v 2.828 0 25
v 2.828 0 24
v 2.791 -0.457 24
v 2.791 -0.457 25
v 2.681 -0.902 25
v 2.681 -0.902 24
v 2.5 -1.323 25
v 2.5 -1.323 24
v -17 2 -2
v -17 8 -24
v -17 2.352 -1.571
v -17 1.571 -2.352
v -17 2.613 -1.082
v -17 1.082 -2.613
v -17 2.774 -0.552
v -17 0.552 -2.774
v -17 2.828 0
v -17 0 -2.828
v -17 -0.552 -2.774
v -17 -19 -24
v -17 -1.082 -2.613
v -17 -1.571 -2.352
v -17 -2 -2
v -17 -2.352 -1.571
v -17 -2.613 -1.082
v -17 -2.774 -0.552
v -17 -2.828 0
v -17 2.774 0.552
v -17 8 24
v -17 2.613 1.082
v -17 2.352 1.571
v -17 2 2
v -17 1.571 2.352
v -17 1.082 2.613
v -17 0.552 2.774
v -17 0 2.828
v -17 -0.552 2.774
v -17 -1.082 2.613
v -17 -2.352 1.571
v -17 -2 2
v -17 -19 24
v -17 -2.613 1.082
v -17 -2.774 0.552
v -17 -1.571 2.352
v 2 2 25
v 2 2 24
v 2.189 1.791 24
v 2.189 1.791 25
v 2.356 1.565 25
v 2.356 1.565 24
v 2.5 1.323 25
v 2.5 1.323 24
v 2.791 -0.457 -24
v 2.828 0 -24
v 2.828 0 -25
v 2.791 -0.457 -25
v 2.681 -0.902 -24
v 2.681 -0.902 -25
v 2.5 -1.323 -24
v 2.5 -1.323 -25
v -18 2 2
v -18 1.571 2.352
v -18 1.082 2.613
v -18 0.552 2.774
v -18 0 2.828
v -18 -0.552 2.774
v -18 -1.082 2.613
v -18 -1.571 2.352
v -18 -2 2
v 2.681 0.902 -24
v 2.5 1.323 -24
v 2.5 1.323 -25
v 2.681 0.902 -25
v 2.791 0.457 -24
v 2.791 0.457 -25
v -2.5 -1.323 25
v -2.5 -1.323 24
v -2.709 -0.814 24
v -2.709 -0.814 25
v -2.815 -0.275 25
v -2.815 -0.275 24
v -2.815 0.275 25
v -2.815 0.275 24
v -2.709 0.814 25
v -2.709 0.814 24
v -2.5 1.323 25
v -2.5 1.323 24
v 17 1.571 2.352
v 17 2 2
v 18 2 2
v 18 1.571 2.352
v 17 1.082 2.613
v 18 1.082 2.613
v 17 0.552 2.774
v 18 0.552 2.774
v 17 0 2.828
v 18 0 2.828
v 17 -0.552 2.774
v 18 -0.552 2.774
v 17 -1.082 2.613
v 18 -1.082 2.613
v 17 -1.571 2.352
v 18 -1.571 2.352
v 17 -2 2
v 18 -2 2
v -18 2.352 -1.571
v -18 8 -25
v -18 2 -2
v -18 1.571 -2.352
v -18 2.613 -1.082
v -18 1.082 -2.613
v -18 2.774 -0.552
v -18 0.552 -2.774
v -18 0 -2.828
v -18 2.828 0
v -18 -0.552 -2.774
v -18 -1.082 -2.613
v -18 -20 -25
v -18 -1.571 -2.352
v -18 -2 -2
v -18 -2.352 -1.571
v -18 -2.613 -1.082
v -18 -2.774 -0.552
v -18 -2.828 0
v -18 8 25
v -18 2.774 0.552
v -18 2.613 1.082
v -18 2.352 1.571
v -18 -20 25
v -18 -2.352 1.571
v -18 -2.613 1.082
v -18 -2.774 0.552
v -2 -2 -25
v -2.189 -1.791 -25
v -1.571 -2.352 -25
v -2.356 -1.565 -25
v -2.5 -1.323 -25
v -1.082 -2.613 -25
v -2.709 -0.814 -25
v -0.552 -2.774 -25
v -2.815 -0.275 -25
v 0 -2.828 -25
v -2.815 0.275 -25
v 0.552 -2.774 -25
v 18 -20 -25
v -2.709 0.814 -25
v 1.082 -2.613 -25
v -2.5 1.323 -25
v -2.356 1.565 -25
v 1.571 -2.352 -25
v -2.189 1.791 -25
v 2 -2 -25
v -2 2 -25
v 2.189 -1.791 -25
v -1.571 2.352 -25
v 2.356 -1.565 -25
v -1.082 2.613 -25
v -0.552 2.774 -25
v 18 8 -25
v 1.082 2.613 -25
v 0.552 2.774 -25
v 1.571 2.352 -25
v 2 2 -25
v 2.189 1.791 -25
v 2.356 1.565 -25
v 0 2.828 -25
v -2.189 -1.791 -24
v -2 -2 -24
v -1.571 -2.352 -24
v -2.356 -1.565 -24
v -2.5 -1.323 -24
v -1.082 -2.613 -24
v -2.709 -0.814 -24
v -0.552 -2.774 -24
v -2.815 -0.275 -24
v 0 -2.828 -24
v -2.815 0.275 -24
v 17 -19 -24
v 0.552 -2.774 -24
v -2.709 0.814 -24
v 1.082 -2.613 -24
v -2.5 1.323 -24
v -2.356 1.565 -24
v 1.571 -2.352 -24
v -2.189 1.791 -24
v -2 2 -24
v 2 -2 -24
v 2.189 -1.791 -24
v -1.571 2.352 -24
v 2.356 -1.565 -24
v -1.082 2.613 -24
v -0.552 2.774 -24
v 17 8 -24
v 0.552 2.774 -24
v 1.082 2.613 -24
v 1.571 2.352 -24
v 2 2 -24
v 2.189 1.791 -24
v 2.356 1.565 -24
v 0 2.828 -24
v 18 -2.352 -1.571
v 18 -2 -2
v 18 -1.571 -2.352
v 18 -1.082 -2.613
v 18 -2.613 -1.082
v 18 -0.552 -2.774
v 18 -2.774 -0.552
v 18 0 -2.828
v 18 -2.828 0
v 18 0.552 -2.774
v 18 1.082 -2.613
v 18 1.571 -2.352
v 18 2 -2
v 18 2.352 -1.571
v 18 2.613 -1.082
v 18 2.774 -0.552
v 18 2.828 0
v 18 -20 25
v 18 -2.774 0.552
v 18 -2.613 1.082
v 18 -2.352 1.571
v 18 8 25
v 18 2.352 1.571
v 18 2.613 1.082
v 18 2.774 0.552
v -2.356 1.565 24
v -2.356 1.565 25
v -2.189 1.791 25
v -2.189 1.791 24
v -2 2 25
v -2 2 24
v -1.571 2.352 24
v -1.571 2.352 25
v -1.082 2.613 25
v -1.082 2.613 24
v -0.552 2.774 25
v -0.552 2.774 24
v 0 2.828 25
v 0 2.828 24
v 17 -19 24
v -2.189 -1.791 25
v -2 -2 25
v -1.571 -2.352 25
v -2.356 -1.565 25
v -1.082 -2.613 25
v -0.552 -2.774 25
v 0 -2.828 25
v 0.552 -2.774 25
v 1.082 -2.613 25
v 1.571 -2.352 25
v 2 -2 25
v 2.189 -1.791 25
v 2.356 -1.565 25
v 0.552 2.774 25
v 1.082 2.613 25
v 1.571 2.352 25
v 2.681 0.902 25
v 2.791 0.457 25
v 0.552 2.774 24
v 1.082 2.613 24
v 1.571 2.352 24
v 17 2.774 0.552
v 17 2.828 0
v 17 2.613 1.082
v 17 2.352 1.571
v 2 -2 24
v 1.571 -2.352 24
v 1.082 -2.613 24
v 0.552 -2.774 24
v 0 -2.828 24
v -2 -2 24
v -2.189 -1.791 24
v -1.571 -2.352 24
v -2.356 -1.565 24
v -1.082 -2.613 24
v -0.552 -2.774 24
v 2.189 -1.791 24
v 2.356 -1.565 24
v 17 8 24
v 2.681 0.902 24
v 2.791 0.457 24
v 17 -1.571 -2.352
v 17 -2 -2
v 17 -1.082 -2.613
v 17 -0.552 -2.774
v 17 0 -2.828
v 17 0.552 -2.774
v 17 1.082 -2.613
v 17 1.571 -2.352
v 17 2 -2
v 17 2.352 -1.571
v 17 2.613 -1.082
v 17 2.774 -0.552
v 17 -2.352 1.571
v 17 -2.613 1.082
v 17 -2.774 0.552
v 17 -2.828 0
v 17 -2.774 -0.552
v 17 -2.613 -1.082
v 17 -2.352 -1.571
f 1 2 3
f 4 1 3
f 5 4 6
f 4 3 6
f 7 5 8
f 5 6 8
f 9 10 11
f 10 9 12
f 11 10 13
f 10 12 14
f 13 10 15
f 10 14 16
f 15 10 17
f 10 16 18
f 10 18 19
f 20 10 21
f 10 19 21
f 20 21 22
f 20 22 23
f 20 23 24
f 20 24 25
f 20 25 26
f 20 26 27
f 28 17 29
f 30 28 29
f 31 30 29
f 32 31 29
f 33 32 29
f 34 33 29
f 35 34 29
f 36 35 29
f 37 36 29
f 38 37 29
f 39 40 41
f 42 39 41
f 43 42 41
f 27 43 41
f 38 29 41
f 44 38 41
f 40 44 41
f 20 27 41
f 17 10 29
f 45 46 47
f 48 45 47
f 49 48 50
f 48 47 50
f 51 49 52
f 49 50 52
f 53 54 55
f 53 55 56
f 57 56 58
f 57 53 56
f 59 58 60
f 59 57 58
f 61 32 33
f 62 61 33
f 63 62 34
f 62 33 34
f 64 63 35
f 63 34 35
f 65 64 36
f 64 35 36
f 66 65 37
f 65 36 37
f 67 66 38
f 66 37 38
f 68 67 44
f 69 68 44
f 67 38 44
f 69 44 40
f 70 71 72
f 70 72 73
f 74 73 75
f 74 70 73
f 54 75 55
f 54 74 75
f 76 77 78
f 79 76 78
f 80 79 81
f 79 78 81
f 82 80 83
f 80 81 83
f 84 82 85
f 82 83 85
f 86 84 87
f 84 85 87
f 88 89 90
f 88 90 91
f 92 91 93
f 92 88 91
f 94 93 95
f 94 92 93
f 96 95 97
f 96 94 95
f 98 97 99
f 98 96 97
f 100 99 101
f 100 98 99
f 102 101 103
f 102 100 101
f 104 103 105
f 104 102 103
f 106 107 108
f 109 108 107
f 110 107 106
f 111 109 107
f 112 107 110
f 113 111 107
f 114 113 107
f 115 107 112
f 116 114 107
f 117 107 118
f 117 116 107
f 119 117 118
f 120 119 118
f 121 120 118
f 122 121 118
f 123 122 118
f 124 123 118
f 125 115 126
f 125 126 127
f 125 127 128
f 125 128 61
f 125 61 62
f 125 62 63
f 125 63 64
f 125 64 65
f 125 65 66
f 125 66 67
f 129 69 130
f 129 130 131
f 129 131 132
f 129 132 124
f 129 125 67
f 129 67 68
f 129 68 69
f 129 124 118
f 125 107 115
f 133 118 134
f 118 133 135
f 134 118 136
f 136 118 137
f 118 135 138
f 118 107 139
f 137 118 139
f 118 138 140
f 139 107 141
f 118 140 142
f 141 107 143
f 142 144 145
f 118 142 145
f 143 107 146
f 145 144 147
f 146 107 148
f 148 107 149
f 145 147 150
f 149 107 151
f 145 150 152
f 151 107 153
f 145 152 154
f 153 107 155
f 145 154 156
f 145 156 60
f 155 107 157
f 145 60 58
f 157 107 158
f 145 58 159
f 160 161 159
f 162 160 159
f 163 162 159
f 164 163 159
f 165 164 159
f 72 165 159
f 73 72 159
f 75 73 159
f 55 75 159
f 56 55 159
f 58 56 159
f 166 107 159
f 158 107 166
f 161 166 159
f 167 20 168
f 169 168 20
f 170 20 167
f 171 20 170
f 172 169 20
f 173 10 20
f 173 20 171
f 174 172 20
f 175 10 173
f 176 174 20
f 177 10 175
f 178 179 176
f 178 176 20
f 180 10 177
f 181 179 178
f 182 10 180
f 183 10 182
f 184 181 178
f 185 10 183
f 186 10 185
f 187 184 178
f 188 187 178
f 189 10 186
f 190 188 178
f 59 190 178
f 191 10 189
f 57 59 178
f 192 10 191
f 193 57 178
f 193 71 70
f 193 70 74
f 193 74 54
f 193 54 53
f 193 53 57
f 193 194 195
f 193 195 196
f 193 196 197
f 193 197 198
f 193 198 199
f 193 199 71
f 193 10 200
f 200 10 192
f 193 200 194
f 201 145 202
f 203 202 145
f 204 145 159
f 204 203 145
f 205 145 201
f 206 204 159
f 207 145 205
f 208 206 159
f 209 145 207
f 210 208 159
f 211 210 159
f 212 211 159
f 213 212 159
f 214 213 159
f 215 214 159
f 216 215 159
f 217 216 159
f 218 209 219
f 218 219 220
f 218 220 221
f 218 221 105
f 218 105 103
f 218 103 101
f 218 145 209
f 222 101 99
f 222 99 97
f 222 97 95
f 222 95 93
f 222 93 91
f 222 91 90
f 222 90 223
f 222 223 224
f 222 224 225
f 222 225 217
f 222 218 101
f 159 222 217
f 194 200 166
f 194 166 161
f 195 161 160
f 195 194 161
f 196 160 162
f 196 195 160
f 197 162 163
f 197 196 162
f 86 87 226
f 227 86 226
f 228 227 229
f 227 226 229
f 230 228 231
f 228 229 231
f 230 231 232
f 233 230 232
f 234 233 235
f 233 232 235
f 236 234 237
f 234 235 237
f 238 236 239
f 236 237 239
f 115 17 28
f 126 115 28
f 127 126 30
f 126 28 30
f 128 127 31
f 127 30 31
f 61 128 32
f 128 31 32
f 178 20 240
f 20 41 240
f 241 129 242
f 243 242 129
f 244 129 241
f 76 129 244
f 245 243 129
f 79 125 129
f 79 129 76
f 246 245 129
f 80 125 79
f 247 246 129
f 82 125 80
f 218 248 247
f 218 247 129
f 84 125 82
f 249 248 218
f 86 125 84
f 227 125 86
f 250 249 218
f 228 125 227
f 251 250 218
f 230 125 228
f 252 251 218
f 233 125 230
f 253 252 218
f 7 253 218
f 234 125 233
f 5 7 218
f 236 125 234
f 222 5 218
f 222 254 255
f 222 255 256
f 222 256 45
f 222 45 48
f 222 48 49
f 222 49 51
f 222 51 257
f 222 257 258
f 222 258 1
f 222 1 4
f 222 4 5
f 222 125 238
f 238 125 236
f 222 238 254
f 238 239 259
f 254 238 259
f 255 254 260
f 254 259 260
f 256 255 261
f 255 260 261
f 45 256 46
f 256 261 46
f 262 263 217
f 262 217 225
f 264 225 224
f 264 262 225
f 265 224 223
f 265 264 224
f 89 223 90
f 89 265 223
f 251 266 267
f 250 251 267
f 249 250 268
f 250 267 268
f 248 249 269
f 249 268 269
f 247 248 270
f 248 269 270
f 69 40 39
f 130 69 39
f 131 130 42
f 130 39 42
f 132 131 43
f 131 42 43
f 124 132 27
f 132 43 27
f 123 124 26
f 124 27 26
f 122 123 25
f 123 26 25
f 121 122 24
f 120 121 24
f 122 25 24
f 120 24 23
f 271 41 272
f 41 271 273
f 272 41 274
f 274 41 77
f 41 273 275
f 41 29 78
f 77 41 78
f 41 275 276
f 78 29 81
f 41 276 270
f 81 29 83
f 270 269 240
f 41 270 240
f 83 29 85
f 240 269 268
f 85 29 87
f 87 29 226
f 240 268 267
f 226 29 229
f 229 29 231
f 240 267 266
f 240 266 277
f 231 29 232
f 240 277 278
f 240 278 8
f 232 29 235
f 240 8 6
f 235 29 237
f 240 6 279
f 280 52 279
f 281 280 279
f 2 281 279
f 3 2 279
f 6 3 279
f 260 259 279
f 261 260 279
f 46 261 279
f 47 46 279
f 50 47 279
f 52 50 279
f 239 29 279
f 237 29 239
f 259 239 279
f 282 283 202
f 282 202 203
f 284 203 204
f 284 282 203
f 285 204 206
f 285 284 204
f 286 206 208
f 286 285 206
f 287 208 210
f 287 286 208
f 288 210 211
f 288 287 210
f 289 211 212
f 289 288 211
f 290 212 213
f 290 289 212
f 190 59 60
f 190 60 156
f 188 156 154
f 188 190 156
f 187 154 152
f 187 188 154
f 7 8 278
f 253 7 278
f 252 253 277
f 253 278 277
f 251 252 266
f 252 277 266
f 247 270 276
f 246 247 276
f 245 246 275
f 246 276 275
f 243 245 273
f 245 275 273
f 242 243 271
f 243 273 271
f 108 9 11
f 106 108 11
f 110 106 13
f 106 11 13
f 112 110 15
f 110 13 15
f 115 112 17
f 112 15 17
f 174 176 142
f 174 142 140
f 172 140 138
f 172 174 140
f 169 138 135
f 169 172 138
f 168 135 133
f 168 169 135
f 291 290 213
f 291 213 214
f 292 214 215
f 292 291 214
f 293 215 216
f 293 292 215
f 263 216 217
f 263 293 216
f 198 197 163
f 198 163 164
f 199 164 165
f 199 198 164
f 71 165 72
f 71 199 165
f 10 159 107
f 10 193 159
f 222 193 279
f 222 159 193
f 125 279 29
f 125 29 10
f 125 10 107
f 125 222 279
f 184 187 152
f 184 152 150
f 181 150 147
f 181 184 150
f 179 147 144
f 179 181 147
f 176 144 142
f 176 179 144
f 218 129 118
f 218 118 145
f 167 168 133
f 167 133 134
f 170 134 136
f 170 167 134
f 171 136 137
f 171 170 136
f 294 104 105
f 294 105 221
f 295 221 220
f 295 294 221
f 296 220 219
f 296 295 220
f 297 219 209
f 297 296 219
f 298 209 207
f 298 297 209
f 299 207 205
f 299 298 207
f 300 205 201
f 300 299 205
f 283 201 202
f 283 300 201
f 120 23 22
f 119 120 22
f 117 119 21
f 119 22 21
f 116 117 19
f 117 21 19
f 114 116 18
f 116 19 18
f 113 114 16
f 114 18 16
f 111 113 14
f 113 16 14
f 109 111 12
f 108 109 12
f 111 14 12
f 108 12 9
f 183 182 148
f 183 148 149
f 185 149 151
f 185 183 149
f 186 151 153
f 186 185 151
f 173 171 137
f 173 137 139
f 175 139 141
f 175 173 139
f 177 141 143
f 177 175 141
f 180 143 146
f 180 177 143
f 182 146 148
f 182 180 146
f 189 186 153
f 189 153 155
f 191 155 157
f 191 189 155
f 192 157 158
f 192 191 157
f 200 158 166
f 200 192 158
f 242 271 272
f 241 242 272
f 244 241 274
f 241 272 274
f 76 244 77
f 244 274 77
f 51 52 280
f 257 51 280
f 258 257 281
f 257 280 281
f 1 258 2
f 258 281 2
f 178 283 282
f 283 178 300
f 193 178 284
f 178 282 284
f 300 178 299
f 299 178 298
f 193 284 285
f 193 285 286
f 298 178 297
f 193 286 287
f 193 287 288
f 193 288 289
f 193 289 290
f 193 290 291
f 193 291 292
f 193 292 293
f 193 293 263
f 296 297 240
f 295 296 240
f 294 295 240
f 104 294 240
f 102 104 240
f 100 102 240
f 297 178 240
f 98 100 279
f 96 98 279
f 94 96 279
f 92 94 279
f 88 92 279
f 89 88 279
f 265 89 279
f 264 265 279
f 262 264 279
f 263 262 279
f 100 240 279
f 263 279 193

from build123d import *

# Parameters (mm, degrees)
F2_DEPTH      = 25
F2_DEPTH_BACK = 25
F3_DEPTH      = 25
F3_DEPTH_BACK = 25
F4_DEPTH      = 24
F4_DEPTH_BACK = 24
F1_W          = 4
F1_H          = 4
F5_DEPTH      = 25
F5_DEPTH_BACK = 25


with BuildPart() as f2:
    # F0 (on Top) → F2 (new body, two sides)
    with BuildSketch(Plane.XY) as f2_sk:
        Polygon((-17, 0), (-17, 8), (-18, 8), (-18, -20), (18, -20), (18, 8), (17, 8), (17, 0), (17, -19), (-17, -19), align=None)
    extrude(amount=F2_DEPTH)
    extrude(f2_sk.sketch, amount=-F2_DEPTH_BACK)

    # F0 (on Top) → F3 (join, two sides)
    with BuildSketch(Plane.XY) as f3_sk:
        with BuildLine():
            ThreePointArc((17, 0), (0, -17), (-17, 0))
            Line((-17, 0), (-17, -19))
            Line((-17, -19), (17, -19))
            Line((17, -19), (17, 0))
        make_face()
        with BuildLine():
            ThreePointArc((15, 0), (10.6066017178, -10.6066017178), (0, -15))
            ThreePointArc((0, -15), (-13.1339255366, -7.2456883731), (-12.6885775404, 8))
            Line((-12.6885775404, 8), (-15, 8))
            ThreePointArc((-15, 8), (-16.4924225025, 4.1231056256), (-17, 0))
            ThreePointArc((-17, 0), (0, -17), (17, 0))
            ThreePointArc((17, 0), (16.4924225025, 4.1231056256), (15, 8))
            Line((15, 8), (12.6885775404, 8))
            ThreePointArc((12.6885775404, 8), (14.4105631935, 4.1636124275), (15, 0))
        make_face()
        with BuildLine():
            ThreePointArc((-12.6885775404, 8), (-13.1339255366, -7.2456883731), (0, -15))
            Line((0, -15), (0, -7.5))
            Line((0, -7.5), (-2.5, -7.5))
            Line((-2.5, -7.5), (-2.5, -1.3228756555))
            ThreePointArc((-2.5, -1.3228756555), (-2.8284271247, 0), (-2.5, 1.3228756555))
            Line((-2.5, 1.3228756555), (-2.5, 7.5))
            Line((-2.5, 7.5), (0, 7.5))
            Line((0, 7.5), (0, 8))
            Line((0, 8), (-12.6885775404, 8))
        make_face()
        with BuildLine():
            Line((0, -7.5), (0, -15))
            ThreePointArc((0, -15), (10.6066017178, -10.6066017178), (15, 0))
            ThreePointArc((15, 0), (14.4105631935, 4.1636124275), (12.6885775404, 8))
            Line((12.6885775404, 8), (0, 8))
            Line((0, 8), (0, 7.5))
            Line((0, 7.5), (2.5, 7.5))
            Line((2.5, 7.5), (2.5, 1.3228756555))
            ThreePointArc((2.5, 1.3228756555), (2.7450926953, 0.6815174936), (2.8284271247, 0))
            ThreePointArc((2.8284271247, 0), (2.7450926953, -0.6815174936), (2.5, -1.3228756555))
            Line((2.5, -1.3228756555), (2.5, -7.5))
            Line((2.5, -7.5), (0, -7.5))
        make_face()
        with BuildLine():
            ThreePointArc((-17, 0), (-16.4924225025, 4.1231056256), (-15, 8))
            Line((-15, 8), (-17, 8))
            Line((-17, 8), (-17, 0))
        make_face()
        with BuildLine():
            Line((17, 8), (15, 8))
            ThreePointArc((15, 8), (16.4924225025, 4.1231056256), (17, 0))
            Line((17, 0), (17, 8))
        make_face()
        with BuildLine():
            Line((0, 2.8284271247), (0, 7.5))
            Line((0, 7.5), (-2.5, 7.5))
            Line((-2.5, 7.5), (-2.5, 1.3228756555))
            ThreePointArc((-2.5, 1.3228756555), (-2.2753295024, 1.6801415582), (-2, 2))
            ThreePointArc((-2, 2), (-1.0823922003, 2.6131259298), (0, 2.8284271247))
        make_face()
        with BuildLine():
            Line((2.5, 7.5), (0, 7.5))
            Line((0, 7.5), (0, 2.8284271247))
            ThreePointArc((0, 2.8284271247), (1.0823922003, 2.6131259298), (2, 2))
            ThreePointArc((2, 2), (2.2753295024, 1.6801415582), (2.5, 1.3228756555))
            Line((2.5, 1.3228756555), (2.5, 7.5))
        make_face()
        with BuildLine():
            Line((0, -2.8284271247), (0, -7.5))
            Line((0, -7.5), (2.5, -7.5))
            Line((2.5, -7.5), (2.5, -1.3228756555))
            ThreePointArc((2.5, -1.3228756555), (2.2753295024, -1.6801415582), (2, -2))
            ThreePointArc((2, -2), (1.0823922003, -2.6131259298), (0, -2.8284271247))
        make_face()
        with BuildLine():
            Line((-2.5, -7.5), (0, -7.5))
            Line((0, -7.5), (0, -2.8284271247))
            ThreePointArc((0, -2.8284271247), (-1.0823922003, -2.6131259298), (-2, -2))
            ThreePointArc((-2, -2), (-2.2753295024, -1.6801415582), (-2.5, -1.3228756555))
            Line((-2.5, -1.3228756555), (-2.5, -7.5))
        make_face()
    extrude(amount=F3_DEPTH)
    extrude(f3_sk.sketch, amount=-F3_DEPTH_BACK)

    # F0 (on Top) → F4 (cut, two sides)
    with BuildSketch(Plane.XY) as f4_sk:
        with BuildLine():
            ThreePointArc((17, 0), (0, -17), (-17, 0))
            Line((-17, 0), (-17, -19))
            Line((-17, -19), (17, -19))
            Line((17, -19), (17, 0))
        make_face()
        with BuildLine():
            Line((0, -7.5), (0, -15))
            ThreePointArc((0, -15), (10.6066017178, -10.6066017178), (15, 0))
            ThreePointArc((15, 0), (14.4105631935, 4.1636124275), (12.6885775404, 8))
            Line((12.6885775404, 8), (0, 8))
            Line((0, 8), (0, 7.5))
            Line((0, 7.5), (2.5, 7.5))
            Line((2.5, 7.5), (2.5, 1.3228756555))
            ThreePointArc((2.5, 1.3228756555), (2.7450926953, 0.6815174936), (2.8284271247, 0))
            ThreePointArc((2.8284271247, 0), (2.7450926953, -0.6815174936), (2.5, -1.3228756555))
            Line((2.5, -1.3228756555), (2.5, -7.5))
            Line((2.5, -7.5), (0, -7.5))
        make_face()
        with BuildLine():
            ThreePointArc((15, 0), (10.6066017178, -10.6066017178), (0, -15))
            ThreePointArc((0, -15), (-13.1339255366, -7.2456883731), (-12.6885775404, 8))
            Line((-12.6885775404, 8), (-15, 8))
            ThreePointArc((-15, 8), (-16.4924225025, 4.1231056256), (-17, 0))
            ThreePointArc((-17, 0), (0, -17), (17, 0))
            ThreePointArc((17, 0), (16.4924225025, 4.1231056256), (15, 8))
            Line((15, 8), (12.6885775404, 8))
            ThreePointArc((12.6885775404, 8), (14.4105631935, 4.1636124275), (15, 0))
        make_face()
        with BuildLine():
            ThreePointArc((-12.6885775404, 8), (-13.1339255366, -7.2456883731), (0, -15))
            Line((0, -15), (0, -7.5))
            Line((0, -7.5), (-2.5, -7.5))
            Line((-2.5, -7.5), (-2.5, -1.3228756555))
            ThreePointArc((-2.5, -1.3228756555), (-2.8284271247, 0), (-2.5, 1.3228756555))
            Line((-2.5, 1.3228756555), (-2.5, 7.5))
            Line((-2.5, 7.5), (0, 7.5))
            Line((0, 7.5), (0, 8))
            Line((0, 8), (-12.6885775404, 8))
        make_face()
        with BuildLine():
            ThreePointArc((-17, 0), (-16.4924225025, 4.1231056256), (-15, 8))
            Line((-15, 8), (-17, 8))
            Line((-17, 8), (-17, 0))
        make_face()
        with BuildLine():
            Line((17, 8), (15, 8))
            ThreePointArc((15, 8), (16.4924225025, 4.1231056256), (17, 0))
            Line((17, 0), (17, 8))
        make_face()
        with BuildLine():
            Line((-2.5, -7.5), (0, -7.5))
            Line((0, -7.5), (0, -2.8284271247))
            ThreePointArc((0, -2.8284271247), (-1.0823922003, -2.6131259298), (-2, -2))
            ThreePointArc((-2, -2), (-2.2753295024, -1.6801415582), (-2.5, -1.3228756555))
            Line((-2.5, -1.3228756555), (-2.5, -7.5))
        make_face()
        with BuildLine():
            Line((0, -2.8284271247), (0, -7.5))
            Line((0, -7.5), (2.5, -7.5))
            Line((2.5, -7.5), (2.5, -1.3228756555))
            ThreePointArc((2.5, -1.3228756555), (2.2753295024, -1.6801415582), (2, -2))
            ThreePointArc((2, -2), (1.0823922003, -2.6131259298), (0, -2.8284271247))
        make_face()
        with BuildLine():
            Line((0, 2.8284271247), (0, 7.5))
            Line((0, 7.5), (-2.5, 7.5))
            Line((-2.5, 7.5), (-2.5, 1.3228756555))
            ThreePointArc((-2.5, 1.3228756555), (-2.2753295024, 1.6801415582), (-2, 2))
            ThreePointArc((-2, 2), (-1.0823922003, 2.6131259298), (0, 2.8284271247))
        make_face()
        with BuildLine():
            Line((2.5, 7.5), (0, 7.5))
            Line((0, 7.5), (0, 2.8284271247))
            ThreePointArc((0, 2.8284271247), (1.0823922003, 2.6131259298), (2, 2))
            ThreePointArc((2, 2), (2.2753295024, 1.6801415582), (2.5, 1.3228756555))
            Line((2.5, 1.3228756555), (2.5, 7.5))
        make_face()
    extrude(amount=F4_DEPTH, mode=Mode.SUBTRACT)
    extrude(f4_sk.sketch, amount=-F4_DEPTH_BACK, mode=Mode.SUBTRACT)

    # F1 (on Right) → F5 (cut, two sides)
    with BuildSketch(Plane.YZ) as f5_sk:
        with BuildLine():
            ThreePointArc((-2, -2), (0, -2.8284271247), (2, -2))
            Line((2, -2), (-2, -2))
        make_face()
        Rectangle(F1_W, F1_H)
        with BuildLine():
            Line((-2, 2), (2, 2))
            ThreePointArc((2, 2), (0, 2.8284271247), (-2, 2))
        make_face()
        with BuildLine():
            ThreePointArc((2.8284271247, 0), (2.6131259298, 1.0823922003), (2, 2))
            Line((2, 2), (2, -2))
            ThreePointArc((2, -2), (2.6131259298, -1.0823922003), (2.8284271247, 0))
        make_face()
        with BuildLine():
            Line((-2, -2), (-2, 2))
            ThreePointArc((-2, 2), (-2.8284271247, 0), (-2, -2))
        make_face()
    extrude(amount=-F5_DEPTH, mode=Mode.SUBTRACT)
    extrude(f5_sk.sketch, amount=F5_DEPTH_BACK, mode=Mode.SUBTRACT)


solid = f2.part
